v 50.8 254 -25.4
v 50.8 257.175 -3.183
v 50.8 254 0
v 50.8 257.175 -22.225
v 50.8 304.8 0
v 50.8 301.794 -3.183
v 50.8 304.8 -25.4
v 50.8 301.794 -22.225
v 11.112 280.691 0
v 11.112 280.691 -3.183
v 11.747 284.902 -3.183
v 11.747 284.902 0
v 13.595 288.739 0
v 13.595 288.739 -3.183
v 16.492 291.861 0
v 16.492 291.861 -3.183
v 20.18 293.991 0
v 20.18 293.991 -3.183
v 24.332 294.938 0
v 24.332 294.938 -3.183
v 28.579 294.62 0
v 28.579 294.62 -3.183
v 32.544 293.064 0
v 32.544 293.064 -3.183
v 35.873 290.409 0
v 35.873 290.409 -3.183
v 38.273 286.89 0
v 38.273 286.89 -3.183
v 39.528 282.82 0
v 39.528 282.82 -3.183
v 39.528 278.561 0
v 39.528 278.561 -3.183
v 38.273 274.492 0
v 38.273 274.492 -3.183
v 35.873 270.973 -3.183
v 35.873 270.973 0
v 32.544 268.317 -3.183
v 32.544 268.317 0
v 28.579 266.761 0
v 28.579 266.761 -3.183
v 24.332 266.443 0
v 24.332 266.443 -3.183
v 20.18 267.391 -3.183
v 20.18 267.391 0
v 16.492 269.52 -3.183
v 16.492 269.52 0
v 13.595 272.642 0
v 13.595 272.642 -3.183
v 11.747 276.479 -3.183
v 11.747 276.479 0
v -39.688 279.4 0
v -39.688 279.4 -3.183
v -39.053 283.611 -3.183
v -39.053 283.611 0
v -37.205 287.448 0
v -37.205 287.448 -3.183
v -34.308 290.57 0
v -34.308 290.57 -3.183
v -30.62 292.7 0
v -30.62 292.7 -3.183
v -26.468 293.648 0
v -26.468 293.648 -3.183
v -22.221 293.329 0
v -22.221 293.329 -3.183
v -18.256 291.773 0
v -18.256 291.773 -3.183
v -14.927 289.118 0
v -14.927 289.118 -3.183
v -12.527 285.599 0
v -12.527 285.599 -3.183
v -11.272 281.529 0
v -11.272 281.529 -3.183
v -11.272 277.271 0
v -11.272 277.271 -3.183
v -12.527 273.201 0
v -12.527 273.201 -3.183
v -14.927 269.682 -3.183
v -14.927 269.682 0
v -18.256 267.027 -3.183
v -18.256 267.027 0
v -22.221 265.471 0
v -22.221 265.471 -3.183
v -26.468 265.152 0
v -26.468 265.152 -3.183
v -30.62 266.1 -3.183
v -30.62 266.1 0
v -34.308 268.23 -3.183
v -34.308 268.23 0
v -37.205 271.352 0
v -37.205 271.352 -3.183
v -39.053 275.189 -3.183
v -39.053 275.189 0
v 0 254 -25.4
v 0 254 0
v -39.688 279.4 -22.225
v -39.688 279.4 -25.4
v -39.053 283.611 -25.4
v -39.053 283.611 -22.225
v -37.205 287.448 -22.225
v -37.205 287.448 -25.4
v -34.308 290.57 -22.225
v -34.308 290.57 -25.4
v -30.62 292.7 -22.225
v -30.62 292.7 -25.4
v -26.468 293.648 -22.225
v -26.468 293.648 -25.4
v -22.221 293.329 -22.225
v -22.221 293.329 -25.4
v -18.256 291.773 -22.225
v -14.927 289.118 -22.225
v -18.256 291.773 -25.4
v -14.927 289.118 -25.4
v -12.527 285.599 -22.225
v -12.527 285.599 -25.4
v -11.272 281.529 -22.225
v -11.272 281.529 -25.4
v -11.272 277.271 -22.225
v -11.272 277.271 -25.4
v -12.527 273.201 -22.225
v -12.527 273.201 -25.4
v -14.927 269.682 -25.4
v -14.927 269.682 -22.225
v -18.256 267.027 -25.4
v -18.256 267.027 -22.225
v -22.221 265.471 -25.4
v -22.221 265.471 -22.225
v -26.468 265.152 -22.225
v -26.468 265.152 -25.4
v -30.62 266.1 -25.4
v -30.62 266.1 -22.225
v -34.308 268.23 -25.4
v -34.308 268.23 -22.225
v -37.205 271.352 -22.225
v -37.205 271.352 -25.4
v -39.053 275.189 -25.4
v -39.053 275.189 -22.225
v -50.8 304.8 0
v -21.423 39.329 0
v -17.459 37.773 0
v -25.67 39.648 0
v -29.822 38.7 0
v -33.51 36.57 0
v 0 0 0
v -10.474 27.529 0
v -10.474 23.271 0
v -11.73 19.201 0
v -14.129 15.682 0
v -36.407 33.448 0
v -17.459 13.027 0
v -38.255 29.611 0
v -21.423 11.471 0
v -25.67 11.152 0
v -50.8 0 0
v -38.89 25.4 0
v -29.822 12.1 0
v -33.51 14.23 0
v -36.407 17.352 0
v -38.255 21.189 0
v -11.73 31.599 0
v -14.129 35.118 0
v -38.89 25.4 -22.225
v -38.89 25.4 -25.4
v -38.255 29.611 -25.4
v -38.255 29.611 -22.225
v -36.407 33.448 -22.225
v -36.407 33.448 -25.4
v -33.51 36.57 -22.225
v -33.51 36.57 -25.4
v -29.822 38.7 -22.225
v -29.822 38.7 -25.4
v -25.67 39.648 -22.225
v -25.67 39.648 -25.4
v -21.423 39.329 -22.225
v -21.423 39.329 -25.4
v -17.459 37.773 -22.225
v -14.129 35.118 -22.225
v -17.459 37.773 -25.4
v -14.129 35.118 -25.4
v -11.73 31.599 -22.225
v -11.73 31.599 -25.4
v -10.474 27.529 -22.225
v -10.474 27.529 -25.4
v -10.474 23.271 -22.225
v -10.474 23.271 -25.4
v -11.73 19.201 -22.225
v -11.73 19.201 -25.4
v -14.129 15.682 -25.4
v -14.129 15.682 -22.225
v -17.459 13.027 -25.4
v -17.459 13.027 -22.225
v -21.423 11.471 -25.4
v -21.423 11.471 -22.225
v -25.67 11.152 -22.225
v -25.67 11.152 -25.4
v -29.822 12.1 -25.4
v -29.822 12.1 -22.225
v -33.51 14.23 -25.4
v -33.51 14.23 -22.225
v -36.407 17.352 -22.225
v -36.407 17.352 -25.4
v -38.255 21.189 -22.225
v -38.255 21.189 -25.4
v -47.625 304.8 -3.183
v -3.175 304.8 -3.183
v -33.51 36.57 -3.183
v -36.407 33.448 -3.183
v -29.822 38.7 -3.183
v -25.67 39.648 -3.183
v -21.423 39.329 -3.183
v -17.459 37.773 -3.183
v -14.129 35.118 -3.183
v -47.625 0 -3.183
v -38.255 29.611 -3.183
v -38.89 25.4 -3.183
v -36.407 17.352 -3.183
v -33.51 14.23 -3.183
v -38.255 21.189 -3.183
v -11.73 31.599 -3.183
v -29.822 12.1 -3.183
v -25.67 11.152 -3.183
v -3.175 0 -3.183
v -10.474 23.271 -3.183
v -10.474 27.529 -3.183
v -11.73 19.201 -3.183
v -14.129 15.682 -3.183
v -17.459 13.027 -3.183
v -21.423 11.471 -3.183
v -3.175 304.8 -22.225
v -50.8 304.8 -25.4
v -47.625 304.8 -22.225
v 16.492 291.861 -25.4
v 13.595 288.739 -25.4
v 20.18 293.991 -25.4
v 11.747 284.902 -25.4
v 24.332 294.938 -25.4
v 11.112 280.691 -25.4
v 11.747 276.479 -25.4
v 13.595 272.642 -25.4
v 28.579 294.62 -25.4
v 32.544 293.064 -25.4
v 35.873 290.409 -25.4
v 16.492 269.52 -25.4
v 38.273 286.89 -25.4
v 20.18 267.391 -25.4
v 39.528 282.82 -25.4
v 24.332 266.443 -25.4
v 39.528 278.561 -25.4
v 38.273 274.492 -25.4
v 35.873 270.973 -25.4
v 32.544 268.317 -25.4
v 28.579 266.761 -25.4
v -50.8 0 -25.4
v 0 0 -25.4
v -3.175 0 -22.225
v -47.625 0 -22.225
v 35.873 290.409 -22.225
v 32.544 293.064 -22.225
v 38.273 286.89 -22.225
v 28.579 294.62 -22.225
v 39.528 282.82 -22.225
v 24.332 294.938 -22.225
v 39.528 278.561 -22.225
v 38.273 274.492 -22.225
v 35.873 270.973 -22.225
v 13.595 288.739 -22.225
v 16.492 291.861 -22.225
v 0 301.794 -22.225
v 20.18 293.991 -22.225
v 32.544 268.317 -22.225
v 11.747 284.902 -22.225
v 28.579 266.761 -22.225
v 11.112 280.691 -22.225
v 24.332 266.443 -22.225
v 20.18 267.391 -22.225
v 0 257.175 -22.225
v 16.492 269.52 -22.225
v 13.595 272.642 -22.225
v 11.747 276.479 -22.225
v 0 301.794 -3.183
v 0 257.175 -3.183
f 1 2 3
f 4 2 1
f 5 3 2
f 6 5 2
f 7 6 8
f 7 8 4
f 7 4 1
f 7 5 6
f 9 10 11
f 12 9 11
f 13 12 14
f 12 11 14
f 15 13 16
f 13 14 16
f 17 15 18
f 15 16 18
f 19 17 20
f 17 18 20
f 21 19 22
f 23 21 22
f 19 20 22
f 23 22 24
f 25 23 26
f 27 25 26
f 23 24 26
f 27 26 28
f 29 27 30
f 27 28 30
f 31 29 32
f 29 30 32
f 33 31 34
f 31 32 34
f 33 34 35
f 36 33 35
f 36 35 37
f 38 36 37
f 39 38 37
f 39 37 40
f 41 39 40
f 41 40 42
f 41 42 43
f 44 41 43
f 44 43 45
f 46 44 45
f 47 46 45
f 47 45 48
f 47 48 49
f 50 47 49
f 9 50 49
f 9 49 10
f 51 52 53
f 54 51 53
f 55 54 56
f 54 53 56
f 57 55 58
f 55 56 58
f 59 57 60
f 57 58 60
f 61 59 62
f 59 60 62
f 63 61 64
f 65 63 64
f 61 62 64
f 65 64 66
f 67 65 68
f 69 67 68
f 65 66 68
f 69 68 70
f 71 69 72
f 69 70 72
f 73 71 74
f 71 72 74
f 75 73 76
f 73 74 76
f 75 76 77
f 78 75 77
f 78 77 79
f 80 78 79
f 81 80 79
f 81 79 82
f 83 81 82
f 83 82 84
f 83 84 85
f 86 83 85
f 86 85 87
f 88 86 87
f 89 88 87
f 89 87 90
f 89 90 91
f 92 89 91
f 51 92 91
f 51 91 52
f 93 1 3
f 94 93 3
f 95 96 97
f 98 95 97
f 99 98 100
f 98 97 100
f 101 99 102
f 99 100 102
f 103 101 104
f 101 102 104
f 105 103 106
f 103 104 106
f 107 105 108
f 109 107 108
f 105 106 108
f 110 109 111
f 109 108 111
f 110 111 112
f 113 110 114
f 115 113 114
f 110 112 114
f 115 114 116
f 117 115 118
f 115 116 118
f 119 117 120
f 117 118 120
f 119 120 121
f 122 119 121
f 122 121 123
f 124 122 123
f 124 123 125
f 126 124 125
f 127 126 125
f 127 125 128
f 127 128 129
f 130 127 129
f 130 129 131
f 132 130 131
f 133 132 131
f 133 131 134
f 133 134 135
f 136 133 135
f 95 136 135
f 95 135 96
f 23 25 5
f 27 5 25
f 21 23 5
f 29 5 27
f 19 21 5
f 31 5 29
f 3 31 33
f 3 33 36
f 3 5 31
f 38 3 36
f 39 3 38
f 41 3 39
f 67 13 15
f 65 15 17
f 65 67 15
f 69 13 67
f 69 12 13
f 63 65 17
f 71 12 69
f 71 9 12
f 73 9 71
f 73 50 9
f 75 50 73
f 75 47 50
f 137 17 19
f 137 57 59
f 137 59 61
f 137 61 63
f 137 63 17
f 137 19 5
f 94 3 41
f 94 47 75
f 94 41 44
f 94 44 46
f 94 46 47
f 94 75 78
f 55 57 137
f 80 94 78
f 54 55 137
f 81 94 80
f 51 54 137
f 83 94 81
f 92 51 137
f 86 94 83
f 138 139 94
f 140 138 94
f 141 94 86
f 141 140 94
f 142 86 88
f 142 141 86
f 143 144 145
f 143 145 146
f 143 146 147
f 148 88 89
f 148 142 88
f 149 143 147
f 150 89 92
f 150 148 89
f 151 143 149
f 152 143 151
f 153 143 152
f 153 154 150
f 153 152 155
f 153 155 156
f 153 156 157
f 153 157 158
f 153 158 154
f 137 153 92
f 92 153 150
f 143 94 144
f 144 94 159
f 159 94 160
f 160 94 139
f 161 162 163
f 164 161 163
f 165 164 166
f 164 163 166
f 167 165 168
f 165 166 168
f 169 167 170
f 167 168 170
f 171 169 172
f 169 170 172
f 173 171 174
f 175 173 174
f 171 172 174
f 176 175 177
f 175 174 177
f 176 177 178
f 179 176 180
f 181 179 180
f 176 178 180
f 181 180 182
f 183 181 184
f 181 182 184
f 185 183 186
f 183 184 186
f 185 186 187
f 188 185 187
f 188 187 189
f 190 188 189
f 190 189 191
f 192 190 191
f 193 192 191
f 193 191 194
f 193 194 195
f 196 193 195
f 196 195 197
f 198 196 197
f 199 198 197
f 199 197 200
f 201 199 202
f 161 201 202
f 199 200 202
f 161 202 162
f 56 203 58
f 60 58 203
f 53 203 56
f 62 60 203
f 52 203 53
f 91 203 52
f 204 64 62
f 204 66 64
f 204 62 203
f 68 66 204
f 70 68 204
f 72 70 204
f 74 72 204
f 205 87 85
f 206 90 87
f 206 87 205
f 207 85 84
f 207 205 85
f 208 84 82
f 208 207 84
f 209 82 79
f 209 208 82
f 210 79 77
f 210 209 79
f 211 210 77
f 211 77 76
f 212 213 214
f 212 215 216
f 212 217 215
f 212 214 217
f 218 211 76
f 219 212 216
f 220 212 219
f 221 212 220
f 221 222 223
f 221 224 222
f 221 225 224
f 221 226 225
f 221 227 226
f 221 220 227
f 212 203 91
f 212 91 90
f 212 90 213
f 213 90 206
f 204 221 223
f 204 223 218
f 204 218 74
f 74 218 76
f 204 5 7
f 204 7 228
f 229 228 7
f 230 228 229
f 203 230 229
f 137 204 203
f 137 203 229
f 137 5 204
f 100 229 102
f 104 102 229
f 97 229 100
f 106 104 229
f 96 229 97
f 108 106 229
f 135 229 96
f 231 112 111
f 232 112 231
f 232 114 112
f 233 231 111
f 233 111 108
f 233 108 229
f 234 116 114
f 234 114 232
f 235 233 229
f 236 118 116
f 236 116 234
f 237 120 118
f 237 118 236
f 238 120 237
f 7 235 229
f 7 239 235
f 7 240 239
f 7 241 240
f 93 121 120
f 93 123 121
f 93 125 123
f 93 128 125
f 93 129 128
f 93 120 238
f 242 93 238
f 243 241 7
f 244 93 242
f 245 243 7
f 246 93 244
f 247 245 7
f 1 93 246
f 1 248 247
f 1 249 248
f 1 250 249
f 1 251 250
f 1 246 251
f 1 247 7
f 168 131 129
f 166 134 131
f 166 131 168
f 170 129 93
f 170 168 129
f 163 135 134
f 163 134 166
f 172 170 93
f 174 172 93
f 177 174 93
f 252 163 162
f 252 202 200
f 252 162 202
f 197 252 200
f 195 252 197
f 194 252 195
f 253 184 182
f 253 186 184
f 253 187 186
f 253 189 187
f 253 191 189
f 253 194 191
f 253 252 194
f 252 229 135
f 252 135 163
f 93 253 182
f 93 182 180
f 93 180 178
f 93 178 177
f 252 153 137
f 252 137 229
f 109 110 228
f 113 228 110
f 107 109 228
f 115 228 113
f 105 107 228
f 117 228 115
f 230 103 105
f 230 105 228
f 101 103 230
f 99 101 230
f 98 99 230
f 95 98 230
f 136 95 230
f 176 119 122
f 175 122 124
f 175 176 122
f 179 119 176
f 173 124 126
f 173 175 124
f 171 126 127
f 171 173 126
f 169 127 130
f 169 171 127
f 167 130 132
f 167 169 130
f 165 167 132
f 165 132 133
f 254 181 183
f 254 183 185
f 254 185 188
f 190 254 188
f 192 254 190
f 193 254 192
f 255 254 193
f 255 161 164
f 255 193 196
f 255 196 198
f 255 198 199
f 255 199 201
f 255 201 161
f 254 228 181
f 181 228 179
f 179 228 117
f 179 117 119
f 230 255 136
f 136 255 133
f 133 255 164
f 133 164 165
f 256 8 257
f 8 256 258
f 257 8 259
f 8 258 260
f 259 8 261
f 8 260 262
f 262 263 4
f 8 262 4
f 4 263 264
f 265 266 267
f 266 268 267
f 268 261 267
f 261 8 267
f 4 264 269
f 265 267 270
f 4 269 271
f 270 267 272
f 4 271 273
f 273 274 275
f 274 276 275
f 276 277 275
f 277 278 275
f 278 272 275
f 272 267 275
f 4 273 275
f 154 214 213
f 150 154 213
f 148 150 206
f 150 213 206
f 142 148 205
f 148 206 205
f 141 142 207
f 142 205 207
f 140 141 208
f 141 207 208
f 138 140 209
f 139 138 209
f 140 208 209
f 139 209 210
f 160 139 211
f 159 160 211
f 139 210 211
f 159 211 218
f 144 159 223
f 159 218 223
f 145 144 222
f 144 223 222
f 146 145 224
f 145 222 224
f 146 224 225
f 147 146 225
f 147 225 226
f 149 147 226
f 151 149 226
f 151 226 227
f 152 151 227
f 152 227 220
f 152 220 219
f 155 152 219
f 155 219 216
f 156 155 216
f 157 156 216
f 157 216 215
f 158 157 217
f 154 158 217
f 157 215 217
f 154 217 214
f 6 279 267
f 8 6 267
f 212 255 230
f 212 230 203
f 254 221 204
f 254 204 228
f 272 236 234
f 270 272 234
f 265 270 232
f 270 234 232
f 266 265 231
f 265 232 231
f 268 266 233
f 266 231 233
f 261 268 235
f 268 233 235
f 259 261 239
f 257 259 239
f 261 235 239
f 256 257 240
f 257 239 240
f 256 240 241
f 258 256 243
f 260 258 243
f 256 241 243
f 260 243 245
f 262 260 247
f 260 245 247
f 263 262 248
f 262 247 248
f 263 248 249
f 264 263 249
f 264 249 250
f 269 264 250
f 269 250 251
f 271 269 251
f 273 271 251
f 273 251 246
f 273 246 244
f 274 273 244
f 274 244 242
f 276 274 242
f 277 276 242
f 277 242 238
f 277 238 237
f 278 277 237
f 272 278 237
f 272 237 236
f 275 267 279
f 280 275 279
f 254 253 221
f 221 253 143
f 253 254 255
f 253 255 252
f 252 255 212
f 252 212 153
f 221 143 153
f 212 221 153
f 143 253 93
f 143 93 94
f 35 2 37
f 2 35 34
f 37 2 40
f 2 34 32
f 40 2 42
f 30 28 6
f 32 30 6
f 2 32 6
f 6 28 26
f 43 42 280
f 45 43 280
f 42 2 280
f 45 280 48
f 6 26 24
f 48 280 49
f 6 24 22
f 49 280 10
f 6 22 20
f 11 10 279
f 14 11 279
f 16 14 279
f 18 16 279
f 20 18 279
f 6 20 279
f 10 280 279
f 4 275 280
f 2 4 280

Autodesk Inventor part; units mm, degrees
ref_plane "YZ Plane" through (0, 0, 0) normal (1, 0, 0) x (0, 1, 0)
ref_plane "XZ Plane" through (0, 0, 0) normal (0, 1, 0) x (-1, 0, 0)
ref_plane "XY Plane" through (0, 0, 0) normal (0, 0, 1) x (1, 0, 0)
sketch "Sketch1" plane through (0, 0, 0) normal (0, 1, 0) x (-1, 0, 0)
  line L0 (0, 0) -> (50.8, 0)
  line L1 (50.8, 0) -> (50.8, -25.4)
  line L2 (50.8, -25.4) -> (0, -25.4)
  line L3 (0, -25.4) -> (0, 0)
  line L4 (47.625, -3.1826) -> (3.175, -3.1826)
  line L5 (3.175, -3.1826) -> (3.175, -22.225)
  line L6 (3.175, -22.225) -> (47.625, -22.225)
  line L7 (47.625, -22.225) -> (47.625, -3.1826)
  dimension "d0" = 50.8
  dimension "d1" = 25.4
  dimension "d2" = 3.175
  dimension "d3" = 3.1826
  dimension "d4" = 3.175
  dimension "d5" = 3.175
extrude "Extrusion1" add sketch "Sketch1" along normal blind 304.8
sketch "Sketch2" plane through (0, 0, 0) normal (1, 0, 0) x (0, 0, -1)
  line L0 (25.4, 0) -> (25.4, 304.8) projected
  line L1 (0, 304.8) -> (25.4, 304.8)
  line L2 (25.4, 304.8) -> (25.4, 254)
  line L3 (25.4, 254) -> (0, 254)
  line L4 (0, 254) -> (0, 304.8)
  line L5 (3.1826, 0) -> (3.1826, 304.8) projected
  line L6 (3.1826, 301.7936) -> (22.225, 301.7936)
  line L7 (22.225, 301.7936) -> (22.225, 257.175)
  line L8 (22.225, 257.175) -> (3.1826, 257.175)
  line L9 (3.1826, 257.175) -> (3.1826, 301.7936)
  point P0 (0, 0)
  dimension "d8" = 50.8
  dimension "d9" = 3.175
  dimension "d10" = 3.175
extrude "Extrusion2" add sketch "Sketch2" along normal blind 50.8 contours L3 L5 L8 L7 L6 L1 L0 | L3 L4 L1 L5
sketch "Sketch3" plane through (0, 0, -25.4) normal (0, 0, -1) x (-1, 0, 0)
  circle A0 centre (-25.4, 280.6907) radius 14.2875
  line L0 (-50.8, 254) -> (-50.8, 304.8) projected
  point P0 (0, 0)
  dimension "d13" = 25.4
  dimension "d14" = 28.575
extrude "Extrusion3" cut sketch "Sketch3" against normal through all
sketch "Sketch4" plane through (0, 0, -25.4) normal (0, 0, -1) x (-1, 0, 0)
  circle A0 centre (24.6023, 25.4) radius 14.2875
  line L0 (50.8, 0) -> (0, 0) projected
  dimension "d17" = 25.4
  dimension "d18" = 28.575
extrude "Extrusion4" cut sketch "Sketch4" against normal through all
sketch "Sketch5" plane through (0, 0, -25.4) normal (0, 0, -1) x (-1, 0, 0)
  circle A0 centre (25.4, 279.4) radius 14.2875
  line L0 (50.8, 304.8) -> (-50.8, 304.8) projected
  line L1 (50.8, 0) -> (50.8, 304.8) projected
  point P0 (0, 0)
  dimension "d21" = 25.4
  dimension "d22" = 28.575
  dimension "d23" = 25.4
extrude "Extrusion5" cut sketch "Sketch5" against normal blind 25.4
properties part number "arm" material "Aluminum 6061"
